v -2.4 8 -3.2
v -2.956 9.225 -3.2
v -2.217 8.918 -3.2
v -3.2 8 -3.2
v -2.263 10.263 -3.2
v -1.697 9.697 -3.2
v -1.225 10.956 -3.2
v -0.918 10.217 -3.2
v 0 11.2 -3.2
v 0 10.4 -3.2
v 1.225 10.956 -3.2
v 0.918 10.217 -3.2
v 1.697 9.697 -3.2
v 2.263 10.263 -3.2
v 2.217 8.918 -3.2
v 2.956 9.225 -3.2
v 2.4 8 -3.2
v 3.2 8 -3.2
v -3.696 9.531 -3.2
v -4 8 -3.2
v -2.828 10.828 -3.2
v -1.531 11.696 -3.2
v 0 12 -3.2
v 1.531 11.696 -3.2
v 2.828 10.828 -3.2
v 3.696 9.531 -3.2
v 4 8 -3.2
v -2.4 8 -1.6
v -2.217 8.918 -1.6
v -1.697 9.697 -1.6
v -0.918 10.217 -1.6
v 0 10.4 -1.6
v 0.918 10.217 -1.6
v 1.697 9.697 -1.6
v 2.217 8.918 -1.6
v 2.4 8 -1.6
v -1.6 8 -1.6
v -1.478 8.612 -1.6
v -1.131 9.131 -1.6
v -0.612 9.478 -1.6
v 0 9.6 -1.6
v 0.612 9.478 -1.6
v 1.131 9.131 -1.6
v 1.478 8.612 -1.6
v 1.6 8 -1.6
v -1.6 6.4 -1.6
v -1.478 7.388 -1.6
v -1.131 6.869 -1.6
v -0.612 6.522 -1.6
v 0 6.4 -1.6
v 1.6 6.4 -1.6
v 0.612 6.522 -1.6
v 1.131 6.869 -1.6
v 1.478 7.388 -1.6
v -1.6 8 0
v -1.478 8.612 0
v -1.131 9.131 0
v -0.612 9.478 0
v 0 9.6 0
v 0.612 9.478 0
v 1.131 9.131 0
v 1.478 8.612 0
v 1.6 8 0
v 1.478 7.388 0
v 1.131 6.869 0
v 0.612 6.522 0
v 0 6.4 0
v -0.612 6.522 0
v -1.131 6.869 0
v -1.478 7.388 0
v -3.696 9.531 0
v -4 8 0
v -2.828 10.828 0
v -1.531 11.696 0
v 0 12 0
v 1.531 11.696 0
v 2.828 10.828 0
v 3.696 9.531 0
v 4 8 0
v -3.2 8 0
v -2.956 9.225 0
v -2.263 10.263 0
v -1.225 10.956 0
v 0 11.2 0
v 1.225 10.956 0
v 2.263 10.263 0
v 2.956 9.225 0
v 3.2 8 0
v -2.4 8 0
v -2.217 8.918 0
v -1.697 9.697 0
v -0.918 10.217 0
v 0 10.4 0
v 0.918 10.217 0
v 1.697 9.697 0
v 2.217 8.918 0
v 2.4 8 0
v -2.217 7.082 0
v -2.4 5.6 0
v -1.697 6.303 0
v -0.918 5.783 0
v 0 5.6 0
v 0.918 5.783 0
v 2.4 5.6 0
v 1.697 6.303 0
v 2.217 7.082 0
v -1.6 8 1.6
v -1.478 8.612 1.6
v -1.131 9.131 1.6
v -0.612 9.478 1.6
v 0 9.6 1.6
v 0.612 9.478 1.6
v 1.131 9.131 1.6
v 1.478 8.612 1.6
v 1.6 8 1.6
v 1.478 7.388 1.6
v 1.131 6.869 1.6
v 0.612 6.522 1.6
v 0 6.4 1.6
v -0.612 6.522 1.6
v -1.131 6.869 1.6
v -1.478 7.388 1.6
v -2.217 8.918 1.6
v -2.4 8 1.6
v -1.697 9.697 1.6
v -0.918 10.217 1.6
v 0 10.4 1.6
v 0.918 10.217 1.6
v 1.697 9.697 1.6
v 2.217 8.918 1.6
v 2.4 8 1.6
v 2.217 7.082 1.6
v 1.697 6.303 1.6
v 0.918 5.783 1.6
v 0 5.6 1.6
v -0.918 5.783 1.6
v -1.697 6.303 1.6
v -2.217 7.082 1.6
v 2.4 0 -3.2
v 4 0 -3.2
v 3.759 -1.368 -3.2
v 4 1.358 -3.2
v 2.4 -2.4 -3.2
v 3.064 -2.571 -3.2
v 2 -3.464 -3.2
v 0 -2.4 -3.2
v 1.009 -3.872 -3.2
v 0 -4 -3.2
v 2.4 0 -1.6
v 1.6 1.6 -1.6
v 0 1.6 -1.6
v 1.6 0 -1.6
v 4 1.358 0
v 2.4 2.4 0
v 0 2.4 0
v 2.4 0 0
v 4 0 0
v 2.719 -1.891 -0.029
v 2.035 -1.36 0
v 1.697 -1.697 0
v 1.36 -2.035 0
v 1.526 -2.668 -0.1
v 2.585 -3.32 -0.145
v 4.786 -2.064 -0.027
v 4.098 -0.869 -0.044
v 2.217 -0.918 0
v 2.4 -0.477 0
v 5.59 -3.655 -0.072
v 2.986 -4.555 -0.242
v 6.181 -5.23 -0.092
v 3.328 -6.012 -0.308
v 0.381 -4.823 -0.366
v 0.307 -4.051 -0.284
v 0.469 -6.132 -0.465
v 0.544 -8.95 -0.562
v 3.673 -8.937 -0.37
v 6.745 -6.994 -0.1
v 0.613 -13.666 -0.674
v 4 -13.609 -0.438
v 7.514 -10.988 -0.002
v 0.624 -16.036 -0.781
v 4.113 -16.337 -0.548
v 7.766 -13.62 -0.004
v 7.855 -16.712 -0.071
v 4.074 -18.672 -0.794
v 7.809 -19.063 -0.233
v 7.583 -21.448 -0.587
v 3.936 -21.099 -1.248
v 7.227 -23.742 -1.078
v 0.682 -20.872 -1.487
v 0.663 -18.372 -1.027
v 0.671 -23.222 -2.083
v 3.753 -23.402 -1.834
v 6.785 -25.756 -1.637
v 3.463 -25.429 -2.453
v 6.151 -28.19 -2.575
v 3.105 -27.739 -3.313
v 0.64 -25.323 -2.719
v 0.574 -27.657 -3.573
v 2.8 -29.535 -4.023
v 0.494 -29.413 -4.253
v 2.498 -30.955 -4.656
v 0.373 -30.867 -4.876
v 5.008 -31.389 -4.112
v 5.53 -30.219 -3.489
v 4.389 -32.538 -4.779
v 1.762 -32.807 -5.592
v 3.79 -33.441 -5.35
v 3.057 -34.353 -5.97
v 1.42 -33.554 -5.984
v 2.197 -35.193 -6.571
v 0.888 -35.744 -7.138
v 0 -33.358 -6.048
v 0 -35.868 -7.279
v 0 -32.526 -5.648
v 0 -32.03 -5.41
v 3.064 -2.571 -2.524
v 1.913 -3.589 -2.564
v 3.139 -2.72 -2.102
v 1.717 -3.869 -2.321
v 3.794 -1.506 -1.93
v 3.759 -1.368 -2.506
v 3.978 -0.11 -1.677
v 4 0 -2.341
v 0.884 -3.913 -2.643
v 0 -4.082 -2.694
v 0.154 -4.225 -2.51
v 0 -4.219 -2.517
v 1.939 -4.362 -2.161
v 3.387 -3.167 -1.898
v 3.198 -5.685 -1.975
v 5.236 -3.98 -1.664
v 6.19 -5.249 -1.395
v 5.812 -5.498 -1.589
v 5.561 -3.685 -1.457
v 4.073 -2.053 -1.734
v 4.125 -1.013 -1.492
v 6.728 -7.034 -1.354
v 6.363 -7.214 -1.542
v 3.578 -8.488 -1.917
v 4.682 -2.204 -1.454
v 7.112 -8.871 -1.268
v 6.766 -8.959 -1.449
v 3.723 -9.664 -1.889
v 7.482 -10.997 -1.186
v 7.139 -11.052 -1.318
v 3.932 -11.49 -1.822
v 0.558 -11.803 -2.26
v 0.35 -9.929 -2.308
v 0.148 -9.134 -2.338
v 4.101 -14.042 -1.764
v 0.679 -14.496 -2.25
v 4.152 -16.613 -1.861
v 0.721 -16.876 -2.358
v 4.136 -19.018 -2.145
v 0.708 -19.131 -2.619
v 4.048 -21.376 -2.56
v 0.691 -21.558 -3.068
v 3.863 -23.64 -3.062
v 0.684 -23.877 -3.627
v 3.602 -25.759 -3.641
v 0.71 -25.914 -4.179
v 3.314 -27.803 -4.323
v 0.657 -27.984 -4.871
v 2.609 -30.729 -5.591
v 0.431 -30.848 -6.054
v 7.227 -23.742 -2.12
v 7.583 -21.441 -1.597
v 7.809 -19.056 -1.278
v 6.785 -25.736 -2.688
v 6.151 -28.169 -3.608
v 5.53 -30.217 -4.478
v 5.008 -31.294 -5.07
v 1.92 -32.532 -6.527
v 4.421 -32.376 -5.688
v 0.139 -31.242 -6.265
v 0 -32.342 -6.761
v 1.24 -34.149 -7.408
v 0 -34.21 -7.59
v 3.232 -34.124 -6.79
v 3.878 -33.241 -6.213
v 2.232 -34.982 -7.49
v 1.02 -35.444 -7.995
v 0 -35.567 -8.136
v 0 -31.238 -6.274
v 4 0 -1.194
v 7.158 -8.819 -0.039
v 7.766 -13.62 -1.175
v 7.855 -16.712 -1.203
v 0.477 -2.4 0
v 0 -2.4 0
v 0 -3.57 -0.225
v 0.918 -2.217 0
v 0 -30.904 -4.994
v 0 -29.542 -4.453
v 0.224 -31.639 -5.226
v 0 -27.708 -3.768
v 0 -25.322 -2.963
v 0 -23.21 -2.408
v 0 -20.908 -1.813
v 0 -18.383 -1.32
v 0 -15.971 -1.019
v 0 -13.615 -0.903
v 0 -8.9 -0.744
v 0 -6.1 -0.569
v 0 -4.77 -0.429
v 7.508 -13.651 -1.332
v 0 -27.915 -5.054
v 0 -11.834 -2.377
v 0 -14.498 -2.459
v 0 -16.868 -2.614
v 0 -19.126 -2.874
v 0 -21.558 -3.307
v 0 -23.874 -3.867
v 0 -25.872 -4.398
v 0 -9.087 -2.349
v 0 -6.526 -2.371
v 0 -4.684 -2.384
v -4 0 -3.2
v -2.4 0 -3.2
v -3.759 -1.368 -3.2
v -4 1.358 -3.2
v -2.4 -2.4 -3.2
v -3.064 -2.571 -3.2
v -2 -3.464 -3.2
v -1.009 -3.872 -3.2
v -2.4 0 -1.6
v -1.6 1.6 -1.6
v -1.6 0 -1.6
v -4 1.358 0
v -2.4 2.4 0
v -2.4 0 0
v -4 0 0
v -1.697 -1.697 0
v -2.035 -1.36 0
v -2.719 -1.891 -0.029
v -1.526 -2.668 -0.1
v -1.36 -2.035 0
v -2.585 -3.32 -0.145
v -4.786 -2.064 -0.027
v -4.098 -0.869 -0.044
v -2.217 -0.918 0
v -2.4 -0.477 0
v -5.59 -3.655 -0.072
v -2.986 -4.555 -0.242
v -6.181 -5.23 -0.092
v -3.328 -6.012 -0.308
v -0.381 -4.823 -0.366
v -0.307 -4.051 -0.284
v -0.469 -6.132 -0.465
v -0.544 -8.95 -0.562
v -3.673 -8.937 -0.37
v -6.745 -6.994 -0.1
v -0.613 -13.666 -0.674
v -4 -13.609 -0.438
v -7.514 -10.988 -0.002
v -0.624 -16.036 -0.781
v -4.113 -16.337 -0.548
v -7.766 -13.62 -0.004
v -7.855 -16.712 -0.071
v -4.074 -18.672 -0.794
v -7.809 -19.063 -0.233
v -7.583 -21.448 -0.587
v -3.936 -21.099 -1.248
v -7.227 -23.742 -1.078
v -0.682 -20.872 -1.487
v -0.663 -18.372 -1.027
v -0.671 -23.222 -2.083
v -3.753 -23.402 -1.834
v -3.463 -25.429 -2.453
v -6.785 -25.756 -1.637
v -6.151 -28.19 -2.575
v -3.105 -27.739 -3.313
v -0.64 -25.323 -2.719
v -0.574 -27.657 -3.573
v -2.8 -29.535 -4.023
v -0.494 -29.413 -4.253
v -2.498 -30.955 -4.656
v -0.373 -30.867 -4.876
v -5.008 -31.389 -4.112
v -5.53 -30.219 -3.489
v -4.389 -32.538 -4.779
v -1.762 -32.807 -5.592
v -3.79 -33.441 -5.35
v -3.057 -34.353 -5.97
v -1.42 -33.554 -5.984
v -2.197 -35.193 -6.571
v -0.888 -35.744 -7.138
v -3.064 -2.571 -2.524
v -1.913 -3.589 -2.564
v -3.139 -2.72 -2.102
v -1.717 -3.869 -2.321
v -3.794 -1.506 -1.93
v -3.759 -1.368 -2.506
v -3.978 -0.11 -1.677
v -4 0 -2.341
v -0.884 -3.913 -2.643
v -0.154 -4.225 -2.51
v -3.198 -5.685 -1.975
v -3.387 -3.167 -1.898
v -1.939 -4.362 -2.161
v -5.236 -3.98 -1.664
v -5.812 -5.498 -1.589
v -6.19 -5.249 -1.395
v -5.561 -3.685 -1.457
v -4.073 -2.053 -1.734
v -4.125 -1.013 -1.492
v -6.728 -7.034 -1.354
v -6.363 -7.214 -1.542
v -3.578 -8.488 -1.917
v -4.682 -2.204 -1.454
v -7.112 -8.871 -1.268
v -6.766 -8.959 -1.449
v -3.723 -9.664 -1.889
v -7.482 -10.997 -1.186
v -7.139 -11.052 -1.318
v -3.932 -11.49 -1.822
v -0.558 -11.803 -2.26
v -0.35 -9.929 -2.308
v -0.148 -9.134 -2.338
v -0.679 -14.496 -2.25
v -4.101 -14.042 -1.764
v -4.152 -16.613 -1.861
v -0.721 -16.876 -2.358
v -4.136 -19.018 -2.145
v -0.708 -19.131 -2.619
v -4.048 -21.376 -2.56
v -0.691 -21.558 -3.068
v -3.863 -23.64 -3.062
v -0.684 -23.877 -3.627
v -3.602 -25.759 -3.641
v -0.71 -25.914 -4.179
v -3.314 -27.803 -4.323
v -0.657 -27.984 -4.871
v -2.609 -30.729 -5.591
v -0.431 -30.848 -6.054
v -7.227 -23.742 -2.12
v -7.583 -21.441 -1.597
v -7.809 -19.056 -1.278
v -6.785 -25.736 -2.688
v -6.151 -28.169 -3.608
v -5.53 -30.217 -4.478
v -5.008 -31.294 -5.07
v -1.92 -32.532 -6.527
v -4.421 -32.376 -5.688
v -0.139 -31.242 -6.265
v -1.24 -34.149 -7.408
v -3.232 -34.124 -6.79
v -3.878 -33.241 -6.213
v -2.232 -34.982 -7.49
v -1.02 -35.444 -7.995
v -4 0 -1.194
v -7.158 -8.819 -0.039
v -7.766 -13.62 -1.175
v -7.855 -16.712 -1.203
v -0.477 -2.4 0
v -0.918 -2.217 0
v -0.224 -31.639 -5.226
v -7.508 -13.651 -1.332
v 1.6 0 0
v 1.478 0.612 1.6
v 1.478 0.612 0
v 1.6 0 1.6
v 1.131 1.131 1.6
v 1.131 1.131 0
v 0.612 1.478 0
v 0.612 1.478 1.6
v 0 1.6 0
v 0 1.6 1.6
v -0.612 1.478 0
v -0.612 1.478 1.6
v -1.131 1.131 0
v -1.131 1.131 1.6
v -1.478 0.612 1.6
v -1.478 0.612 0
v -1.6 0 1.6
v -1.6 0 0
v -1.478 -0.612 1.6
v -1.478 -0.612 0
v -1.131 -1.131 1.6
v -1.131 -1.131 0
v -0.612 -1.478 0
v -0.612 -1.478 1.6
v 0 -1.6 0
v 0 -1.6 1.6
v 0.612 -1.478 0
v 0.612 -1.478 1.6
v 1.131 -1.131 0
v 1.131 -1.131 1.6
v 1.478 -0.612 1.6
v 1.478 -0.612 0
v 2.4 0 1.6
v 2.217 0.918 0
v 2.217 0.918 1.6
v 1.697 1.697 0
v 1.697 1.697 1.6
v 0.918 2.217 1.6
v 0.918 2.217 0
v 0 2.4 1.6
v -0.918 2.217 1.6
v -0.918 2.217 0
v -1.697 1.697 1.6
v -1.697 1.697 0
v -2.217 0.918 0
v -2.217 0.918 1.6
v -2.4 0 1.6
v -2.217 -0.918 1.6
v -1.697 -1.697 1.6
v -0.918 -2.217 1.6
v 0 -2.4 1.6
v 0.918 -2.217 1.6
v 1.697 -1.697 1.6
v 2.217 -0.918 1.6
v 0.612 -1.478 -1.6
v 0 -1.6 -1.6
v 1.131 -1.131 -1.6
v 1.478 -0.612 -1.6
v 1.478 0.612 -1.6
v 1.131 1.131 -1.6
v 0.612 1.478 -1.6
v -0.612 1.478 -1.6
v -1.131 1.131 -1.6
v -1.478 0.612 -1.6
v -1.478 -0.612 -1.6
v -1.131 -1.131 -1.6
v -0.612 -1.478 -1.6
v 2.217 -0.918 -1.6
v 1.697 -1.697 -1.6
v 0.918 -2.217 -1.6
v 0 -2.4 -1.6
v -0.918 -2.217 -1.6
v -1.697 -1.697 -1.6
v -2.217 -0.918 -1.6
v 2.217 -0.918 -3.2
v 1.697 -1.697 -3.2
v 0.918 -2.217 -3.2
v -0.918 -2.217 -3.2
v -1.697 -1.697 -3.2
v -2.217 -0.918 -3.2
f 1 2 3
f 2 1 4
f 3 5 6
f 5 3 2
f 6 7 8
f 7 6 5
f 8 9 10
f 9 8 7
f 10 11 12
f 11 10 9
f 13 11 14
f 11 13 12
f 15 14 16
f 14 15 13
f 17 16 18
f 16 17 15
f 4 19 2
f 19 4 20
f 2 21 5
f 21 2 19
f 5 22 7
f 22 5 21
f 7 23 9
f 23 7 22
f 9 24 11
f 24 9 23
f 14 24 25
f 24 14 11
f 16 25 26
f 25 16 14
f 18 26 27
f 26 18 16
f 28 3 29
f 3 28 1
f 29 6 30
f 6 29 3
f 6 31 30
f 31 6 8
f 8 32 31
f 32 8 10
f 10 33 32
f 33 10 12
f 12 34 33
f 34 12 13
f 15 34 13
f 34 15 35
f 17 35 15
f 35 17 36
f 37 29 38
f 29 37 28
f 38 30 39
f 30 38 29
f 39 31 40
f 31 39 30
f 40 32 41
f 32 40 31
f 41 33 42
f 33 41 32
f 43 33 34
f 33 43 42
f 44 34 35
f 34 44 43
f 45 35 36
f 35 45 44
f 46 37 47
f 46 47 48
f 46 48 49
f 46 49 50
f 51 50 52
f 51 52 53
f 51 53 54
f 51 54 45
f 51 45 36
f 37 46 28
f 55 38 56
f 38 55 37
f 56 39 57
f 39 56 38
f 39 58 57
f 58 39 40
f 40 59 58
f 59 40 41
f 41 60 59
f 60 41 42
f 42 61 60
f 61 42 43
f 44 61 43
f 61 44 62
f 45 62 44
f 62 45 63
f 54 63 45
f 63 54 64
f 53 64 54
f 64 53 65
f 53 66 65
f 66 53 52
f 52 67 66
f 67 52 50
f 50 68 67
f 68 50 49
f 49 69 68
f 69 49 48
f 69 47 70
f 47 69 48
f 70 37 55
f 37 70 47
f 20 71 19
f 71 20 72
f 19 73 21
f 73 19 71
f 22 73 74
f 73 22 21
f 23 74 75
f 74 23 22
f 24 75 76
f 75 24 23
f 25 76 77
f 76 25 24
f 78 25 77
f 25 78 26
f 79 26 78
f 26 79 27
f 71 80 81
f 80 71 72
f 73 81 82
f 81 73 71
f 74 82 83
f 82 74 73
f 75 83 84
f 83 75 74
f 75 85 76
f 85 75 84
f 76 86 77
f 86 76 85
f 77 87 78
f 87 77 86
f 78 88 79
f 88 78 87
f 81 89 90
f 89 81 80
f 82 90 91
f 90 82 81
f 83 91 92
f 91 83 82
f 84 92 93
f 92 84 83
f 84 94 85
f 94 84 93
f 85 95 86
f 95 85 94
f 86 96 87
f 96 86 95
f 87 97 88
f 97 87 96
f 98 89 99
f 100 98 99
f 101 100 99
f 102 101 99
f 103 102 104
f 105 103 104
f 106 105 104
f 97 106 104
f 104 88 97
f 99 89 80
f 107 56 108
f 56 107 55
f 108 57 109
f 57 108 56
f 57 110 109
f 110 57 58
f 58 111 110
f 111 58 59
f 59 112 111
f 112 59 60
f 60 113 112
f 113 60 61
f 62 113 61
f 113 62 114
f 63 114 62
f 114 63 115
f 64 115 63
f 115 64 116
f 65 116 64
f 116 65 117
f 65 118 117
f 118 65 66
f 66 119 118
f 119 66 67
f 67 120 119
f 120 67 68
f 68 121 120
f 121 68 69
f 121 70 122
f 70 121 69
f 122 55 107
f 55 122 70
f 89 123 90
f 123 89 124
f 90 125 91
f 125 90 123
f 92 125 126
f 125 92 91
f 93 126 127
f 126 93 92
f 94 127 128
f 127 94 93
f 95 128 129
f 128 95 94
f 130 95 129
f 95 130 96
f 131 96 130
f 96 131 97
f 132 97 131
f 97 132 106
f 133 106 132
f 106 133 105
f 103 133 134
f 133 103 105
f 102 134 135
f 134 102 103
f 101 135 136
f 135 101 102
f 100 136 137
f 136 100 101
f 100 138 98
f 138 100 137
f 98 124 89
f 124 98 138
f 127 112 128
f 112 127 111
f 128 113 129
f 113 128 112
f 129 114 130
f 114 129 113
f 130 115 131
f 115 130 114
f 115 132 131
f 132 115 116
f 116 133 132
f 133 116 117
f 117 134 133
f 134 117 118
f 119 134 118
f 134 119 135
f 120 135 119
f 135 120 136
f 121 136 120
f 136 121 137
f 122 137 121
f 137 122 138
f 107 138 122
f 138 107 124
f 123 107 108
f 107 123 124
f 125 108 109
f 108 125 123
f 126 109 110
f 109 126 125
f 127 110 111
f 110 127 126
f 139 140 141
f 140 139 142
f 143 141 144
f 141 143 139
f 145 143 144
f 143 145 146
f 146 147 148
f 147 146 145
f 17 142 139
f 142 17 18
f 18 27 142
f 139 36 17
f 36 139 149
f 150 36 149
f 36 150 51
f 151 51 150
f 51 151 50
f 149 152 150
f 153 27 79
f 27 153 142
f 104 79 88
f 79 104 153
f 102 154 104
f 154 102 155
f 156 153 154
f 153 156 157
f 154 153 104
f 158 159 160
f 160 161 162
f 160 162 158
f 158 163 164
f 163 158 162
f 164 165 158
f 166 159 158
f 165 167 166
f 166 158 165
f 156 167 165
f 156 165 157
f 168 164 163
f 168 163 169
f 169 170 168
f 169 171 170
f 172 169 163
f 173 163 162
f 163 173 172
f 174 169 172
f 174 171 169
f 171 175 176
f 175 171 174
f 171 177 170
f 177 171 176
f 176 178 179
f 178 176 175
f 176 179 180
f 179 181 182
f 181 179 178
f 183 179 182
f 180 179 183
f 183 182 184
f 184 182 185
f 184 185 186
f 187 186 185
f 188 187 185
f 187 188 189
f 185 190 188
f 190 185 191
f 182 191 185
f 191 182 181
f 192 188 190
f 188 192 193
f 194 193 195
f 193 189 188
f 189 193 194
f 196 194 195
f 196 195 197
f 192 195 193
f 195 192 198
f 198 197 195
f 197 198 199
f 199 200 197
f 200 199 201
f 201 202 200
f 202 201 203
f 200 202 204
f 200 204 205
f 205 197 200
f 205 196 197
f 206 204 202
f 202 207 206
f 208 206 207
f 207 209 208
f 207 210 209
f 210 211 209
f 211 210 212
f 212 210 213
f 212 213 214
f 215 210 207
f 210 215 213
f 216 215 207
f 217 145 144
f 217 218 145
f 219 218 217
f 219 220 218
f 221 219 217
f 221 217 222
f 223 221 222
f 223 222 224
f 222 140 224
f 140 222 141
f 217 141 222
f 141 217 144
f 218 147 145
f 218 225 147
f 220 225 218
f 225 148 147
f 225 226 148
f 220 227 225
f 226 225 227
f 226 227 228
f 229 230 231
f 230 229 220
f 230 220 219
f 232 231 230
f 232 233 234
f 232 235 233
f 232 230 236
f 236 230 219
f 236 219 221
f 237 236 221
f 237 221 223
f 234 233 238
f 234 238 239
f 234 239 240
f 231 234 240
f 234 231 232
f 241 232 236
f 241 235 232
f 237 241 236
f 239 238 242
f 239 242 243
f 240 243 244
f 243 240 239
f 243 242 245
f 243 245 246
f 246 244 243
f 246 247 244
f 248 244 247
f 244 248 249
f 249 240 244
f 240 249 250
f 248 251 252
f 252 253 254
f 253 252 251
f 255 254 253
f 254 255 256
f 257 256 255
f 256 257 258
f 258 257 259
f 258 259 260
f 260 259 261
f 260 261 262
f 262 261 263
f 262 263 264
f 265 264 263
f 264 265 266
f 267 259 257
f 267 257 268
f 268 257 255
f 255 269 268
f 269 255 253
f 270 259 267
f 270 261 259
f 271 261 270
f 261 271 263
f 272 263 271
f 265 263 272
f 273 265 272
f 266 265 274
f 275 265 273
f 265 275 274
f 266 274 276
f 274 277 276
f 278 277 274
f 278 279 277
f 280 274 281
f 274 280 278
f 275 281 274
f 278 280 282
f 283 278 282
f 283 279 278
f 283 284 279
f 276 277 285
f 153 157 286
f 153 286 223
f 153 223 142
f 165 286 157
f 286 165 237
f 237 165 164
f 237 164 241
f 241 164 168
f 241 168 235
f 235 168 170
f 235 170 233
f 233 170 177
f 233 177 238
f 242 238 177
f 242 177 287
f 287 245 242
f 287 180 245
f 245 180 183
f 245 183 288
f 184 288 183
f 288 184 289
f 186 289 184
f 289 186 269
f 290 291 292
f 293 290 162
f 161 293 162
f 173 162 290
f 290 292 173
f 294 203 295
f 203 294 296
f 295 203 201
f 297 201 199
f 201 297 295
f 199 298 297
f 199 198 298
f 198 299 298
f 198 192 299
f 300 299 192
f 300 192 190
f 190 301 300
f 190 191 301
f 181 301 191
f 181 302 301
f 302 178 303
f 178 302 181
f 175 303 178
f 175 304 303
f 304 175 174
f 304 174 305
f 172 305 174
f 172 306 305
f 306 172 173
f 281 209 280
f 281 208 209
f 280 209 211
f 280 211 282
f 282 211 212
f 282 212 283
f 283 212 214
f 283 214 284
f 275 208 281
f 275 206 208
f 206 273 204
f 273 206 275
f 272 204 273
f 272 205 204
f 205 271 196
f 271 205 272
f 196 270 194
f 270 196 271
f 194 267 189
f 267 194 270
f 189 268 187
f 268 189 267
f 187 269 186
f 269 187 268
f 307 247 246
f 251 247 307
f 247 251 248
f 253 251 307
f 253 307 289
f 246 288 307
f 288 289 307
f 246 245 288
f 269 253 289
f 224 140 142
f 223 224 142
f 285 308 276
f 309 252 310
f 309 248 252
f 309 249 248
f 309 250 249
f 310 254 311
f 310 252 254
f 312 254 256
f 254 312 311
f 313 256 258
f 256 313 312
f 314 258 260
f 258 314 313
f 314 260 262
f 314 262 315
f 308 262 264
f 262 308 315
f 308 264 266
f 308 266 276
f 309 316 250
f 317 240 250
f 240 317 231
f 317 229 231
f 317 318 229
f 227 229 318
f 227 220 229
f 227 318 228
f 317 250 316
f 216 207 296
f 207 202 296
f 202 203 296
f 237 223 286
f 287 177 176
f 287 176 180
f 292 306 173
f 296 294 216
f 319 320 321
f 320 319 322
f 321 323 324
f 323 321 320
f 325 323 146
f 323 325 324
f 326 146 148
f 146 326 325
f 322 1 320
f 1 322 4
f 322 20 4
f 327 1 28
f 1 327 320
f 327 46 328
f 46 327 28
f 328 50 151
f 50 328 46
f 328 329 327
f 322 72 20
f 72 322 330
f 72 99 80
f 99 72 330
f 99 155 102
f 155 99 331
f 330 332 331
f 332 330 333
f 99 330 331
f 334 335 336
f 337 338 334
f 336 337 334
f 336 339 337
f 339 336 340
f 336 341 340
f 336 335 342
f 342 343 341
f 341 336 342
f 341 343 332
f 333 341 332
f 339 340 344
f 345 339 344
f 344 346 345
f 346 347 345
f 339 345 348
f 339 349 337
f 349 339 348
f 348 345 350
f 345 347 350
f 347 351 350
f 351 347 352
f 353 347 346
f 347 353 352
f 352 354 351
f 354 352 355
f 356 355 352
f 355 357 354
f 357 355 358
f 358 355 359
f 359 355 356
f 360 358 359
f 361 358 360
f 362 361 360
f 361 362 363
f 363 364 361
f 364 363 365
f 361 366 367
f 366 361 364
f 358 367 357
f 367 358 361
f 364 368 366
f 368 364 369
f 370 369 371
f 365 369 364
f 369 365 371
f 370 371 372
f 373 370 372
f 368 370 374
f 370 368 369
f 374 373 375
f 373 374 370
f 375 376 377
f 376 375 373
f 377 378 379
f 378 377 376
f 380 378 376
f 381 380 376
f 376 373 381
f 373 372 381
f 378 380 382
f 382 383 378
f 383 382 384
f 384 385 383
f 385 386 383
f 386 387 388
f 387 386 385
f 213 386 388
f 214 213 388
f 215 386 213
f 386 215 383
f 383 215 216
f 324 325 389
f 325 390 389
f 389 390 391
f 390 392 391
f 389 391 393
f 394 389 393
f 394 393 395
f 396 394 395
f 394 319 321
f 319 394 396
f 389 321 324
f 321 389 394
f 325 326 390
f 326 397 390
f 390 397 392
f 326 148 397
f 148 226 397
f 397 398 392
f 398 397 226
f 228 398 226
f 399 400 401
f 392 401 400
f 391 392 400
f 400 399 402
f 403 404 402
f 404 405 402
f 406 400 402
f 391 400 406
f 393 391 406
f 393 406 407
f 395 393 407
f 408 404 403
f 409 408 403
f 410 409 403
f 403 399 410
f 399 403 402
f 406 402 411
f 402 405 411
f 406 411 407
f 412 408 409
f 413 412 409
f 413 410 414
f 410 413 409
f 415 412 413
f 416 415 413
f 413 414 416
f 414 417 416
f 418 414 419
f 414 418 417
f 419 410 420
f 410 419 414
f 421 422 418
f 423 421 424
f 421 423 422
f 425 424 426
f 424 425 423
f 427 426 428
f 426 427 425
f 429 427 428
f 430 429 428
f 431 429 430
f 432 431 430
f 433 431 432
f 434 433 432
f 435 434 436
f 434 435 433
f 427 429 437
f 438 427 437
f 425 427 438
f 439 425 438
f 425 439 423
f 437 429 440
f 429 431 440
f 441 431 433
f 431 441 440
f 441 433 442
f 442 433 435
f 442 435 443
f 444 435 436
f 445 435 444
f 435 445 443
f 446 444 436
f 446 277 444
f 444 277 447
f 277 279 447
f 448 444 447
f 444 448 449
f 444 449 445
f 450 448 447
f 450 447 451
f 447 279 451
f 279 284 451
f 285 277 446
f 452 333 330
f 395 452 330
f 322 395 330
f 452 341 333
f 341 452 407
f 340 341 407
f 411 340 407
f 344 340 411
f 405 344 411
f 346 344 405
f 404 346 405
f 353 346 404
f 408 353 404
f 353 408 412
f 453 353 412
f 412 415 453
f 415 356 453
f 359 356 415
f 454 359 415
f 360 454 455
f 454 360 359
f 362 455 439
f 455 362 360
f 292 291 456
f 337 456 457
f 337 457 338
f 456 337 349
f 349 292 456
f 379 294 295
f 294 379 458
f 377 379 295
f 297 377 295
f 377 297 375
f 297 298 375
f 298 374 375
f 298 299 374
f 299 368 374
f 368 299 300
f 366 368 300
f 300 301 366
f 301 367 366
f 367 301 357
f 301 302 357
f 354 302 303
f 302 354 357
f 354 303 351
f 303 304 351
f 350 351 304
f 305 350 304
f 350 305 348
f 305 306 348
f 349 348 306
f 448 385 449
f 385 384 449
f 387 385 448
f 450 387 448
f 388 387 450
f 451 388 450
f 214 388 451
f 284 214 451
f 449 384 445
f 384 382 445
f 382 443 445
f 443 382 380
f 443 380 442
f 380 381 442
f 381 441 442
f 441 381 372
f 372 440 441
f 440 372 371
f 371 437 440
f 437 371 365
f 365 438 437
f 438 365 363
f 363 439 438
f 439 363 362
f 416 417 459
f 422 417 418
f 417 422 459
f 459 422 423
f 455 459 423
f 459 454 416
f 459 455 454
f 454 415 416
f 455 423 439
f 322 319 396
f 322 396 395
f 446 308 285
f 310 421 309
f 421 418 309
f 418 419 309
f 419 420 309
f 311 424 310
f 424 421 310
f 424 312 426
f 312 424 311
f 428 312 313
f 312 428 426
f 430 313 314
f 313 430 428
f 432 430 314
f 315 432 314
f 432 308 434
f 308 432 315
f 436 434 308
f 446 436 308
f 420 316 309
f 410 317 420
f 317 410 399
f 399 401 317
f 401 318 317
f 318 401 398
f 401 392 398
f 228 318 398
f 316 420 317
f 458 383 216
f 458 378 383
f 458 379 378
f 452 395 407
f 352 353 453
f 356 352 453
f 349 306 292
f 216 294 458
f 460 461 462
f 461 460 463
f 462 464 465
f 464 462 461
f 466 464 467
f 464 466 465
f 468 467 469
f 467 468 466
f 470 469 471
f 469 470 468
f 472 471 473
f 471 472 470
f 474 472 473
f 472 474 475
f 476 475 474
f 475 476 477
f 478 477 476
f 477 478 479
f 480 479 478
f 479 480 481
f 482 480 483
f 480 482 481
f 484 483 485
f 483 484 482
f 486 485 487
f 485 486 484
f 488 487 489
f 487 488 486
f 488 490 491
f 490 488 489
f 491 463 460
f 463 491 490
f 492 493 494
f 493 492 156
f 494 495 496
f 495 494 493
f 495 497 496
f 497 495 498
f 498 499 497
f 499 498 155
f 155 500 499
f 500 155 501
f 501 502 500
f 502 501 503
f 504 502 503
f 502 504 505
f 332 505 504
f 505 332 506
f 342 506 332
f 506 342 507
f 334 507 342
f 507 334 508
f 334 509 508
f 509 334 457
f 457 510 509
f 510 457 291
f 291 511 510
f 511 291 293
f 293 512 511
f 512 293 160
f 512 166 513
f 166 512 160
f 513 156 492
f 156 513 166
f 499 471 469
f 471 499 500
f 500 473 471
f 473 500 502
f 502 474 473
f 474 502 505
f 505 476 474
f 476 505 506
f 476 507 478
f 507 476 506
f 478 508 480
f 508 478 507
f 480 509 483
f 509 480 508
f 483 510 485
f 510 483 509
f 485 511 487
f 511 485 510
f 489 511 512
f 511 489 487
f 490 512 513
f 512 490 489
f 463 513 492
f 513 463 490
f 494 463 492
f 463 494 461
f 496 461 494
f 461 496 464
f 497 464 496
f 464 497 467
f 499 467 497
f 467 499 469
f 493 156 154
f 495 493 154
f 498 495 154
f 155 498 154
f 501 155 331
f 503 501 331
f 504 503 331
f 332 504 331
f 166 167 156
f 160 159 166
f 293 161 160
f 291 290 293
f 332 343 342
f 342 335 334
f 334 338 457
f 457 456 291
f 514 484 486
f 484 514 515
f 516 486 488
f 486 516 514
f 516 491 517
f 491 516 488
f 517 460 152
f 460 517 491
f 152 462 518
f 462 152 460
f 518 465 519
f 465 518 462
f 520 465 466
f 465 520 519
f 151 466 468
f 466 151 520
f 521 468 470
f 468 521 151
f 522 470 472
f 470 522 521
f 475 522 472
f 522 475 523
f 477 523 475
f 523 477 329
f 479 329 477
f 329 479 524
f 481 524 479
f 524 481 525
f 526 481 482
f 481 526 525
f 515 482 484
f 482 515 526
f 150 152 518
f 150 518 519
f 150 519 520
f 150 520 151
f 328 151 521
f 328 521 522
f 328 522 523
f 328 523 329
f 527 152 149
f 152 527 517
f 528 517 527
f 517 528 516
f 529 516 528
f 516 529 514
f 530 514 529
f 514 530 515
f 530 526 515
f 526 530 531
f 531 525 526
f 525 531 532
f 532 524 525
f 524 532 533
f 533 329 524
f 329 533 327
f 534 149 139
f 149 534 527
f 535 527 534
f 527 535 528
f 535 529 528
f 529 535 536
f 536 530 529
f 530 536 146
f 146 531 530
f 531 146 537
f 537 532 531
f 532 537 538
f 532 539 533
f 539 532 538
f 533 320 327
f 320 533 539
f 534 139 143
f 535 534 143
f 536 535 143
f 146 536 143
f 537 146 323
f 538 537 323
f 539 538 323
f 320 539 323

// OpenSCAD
use <../lib.scad>
use <../p/1-4tang.scad>
use <../p/2-4cylo.scad>
use <../p/2-4ndis.scad>
use <../p/2-4ring2.scad>
use <../p/4-4cyli.scad>
use <../p/4-4edge.scad>
use <s/3565s01.scad>
use <s/77850s01.scad>
use <../p/stud2a.scad>
function ldraw_lib__3565() = [
// 0 Plant Palm Leaf  2 x  6 Rounded with Rounded  1 x 2 Plate
// 0 Name: 3565.dat
// 0 Author: Gerald Lasser [GeraldLasser]
// 0 !LDRAW_ORG Part UPDATE 2023-07
// 0 !LICENSE Licensed under CC BY 4.0 : see CAreadme.txt
// 
// 0 BFC CERTIFY CCW
  [0,"BFC","CERTIFY"],
  [0,"BFC","CCW"],
// 
// 0 !HISTORY 2023-08-01 {LEGO Instructions App} Original part shape
// 0 !HISTORY 2023-11-29 [GeraldLasser] File preparation for LDraw Parts Tracker
// 0 !HISTORY 2023-12-31 [OrionP] Official Update 2023-07
// 
// 1 16 0 0 20 0 0 -1 0 1 0 -1 0 0 s\77850s01.dat
  [1,16,0,0,20,0,0,-1,0,1,0,-1,0,0, ldraw_lib__s__77850s01()],
// 1 16 0 0 0 1 0 0 0 1 0 0 0 1 s\3565s01.dat
  [1,16,0,0,0,1,0,0,0,1,0,0,0,1, ldraw_lib__s__3565s01()],
// 1 16 0 0 0 -1 0 0 0 1 0 0 0 1 s\3565s01.dat
  [1,16,0,0,0,-1,0,0,0,1,0,0,0,1, ldraw_lib__s__3565s01()],
// 
// 1 16 0 0 0 1 0 0 0 1 0 0 0 1 stud2a.dat
  [1,16,0,0,0,1,0,0,0,1,0,0,0,1, ldraw_lib__stud2a()],
// 1 16 0 0 0 6 0 0 0 1 0 0 0 6 2-4ndis.dat
  [1,16,0,0,0,6,0,0,0,1,0,0,0,6, ldraw_lib__2_4ndis()],
// 1 16 0 0 0 6 0 0 0 1 0 0 0 -6 1-4tang.dat
  [1,16,0,0,0,6,0,0,0,1,0,0,0,-6, ldraw_lib__1_4tang()],
// 1 16 0 0 0 -6 0 0 0 1 0 0 0 -6 1-4tang.dat
  [1,16,0,0,0,-6,0,0,0,1,0,0,0,-6, ldraw_lib__1_4tang()],
// 1 16 0 0 0 0 0 6 0 1 0 -6 0 0 4-4edge.dat
  [1,16,0,0,0,0,0,6,0,1,0,-6,0,0, ldraw_lib__4_4edge()],
// 0 BFC INVERTNEXT
  [0,"BFC","INVERTNEXT"],
// 1 16 0 0 0 0 0 4 0 4 0 -4 0 0 4-4cyli.dat
  [1,16,0,0,0,0,0,4,0,4,0,-4,0,0, ldraw_lib__4_4cyli()],
// 1 16 0 4 0 0 0 4 0 1 0 -4 0 0 4-4edge.dat
  [1,16,0,4,0,0,0,4,0,1,0,-4,0,0, ldraw_lib__4_4edge()],
// 1 16 0 4 0 4 0 0 0 -1 0 0 0 4 2-4ndis.dat
  [1,16,0,4,0,4,0,0,0,-1,0,0,0,4, ldraw_lib__2_4ndis()],
// 1 16 0 4 0 2 0 0 0 -1 0 0 0 -2 2-4ring2.dat
  [1,16,0,4,0,2,0,0,0,-1,0,0,0,-2, ldraw_lib__2_4ring2()],
// 0 BFC INVERTNEXT
  [0,"BFC","INVERTNEXT"],
// 1 16 0 4 0 6 0 0 0 4 0 0 0 -6 2-4cylo.dat
  [1,16,0,4,0,6,0,0,0,4,0,0,0,-6, ldraw_lib__2_4cylo()],
// 1 16 0 8 0 6 0 0 0 -1 0 0 0 -6 2-4ndis.dat
  [1,16,0,8,0,6,0,0,0,-1,0,0,0,-6, ldraw_lib__2_4ndis()],
// 
// 5 24 0 12.486 -77.26 0 13.525 -80.075 .56 13.066 -79.097 -.56 13.066 -79.097
  [5,24,0,12.486,-77.26,0,13.525,-80.075,.56,13.066,-79.097,-.56,13.066,-79.097],
// 5 24 0 7.408 -63.306 0 9.42 -69.27 1.435 8.932 -69.142 -1.435 8.932 -69.142
  [5,24,0,7.408,-63.306,0,9.42,-69.27,1.435,8.932,-69.142,-1.435,8.932,-69.142],
// 5 24 0 14.12 -81.315 0 15.12 -83.396 -3.549 14.96 -83.884 3.549 14.96 -83.884
  [5,24,0,14.12,-81.315,0,15.12,-83.396,-3.549,14.96,-83.884,3.549,14.96,-83.884],
// 5 24 0 2.258 -34.038 0 2.548 -39.927 1.559 1.953 -40.09 -1.559 1.953 -40.09
  [5,24,0,2.258,-34.038,0,2.548,-39.927,1.559,1.953,-40.09,-1.559,1.953,-40.09],
// 5 24 0 18.976 -85.526 0 16.902 -80.855 -3.099 18.519 -85.372 3.099 18.519 -85.372
  [5,24,0,18.976,-85.526,0,16.902,-80.855,-3.099,18.519,-85.372,3.099,18.519,-85.372],
// 5 24 0 .563 -8.924 0 1.072 -11.925 .768 .709 -10.128 -.768 .709 -10.128
  [5,24,0,.563,-8.924,0,1.072,-11.925,.768,.709,-10.128,-.768,.709,-10.128],
// 5 24 0 11.132 -73.854 0 12.486 -77.26 .56 13.066 -79.097 -.56 13.066 -79.097
  [5,24,0,11.132,-73.854,0,12.486,-77.26,.56,13.066,-79.097,-.56,13.066,-79.097],
// 5 24 0 12.636 -69.787 0 10.995 -64.681 -1.775 10.447 -64.784 1.775 10.447 -64.784
  [5,24,0,12.636,-69.787,0,10.995,-64.681,-1.775,10.447,-64.784,1.775,10.447,-64.784],
// 5 24 0 5.873 -22.718 0 5.927 -16.314 -.371 5.844 -22.836 .371 5.844 -22.836
  [5,24,0,5.873,-22.718,0,5.927,-16.314,-.371,5.844,-22.836,.371,5.844,-22.836],
// 5 24 0 6.734 -10.206 0 8 -10 -2.209 6.608 -9.782 2.209 6.608 -9.782
  [5,24,0,6.734,-10.206,0,8,-10,-2.209,6.608,-9.782,2.209,6.608,-9.782],
// 5 24 0 4.533 -52.271 0 6.02 -58.026 -1.678 5.207 -58.056 1.678 5.207 -58.056
  [5,24,0,4.533,-52.271,0,6.02,-58.026,-1.678,5.207,-58.056,1.678,5.207,-58.056],
// 5 24 0 15.12 -83.396 0 18.197 -89.669 2.219 17.846 -89.36 -2.219 17.846 -89.36
  [5,24,0,15.12,-83.396,0,18.197,-89.669,2.219,17.846,-89.36,-2.219,17.846,-89.36],
// 5 24 0 6.147 -36.245 0 5.942 -29.584 1.697 5.625 -36.241 -1.697 5.625 -36.241
  [5,24,0,6.147,-36.245,0,5.942,-29.584,1.697,5.625,-36.241,-1.697,5.625,-36.241],
// 5 24 0 2.548 -39.927 0 3.299 -45.957 1.559 1.953 -40.09 -1.559 1.953 -40.09
  [5,24,0,2.548,-39.927,0,3.299,-45.957,1.559,1.953,-40.09,-1.559,1.953,-40.09],
// 5 24 0 9.42 -69.27 0 11.132 -73.854 1.236 10.632 -73.533 -1.236 10.632 -73.533
  [5,24,0,9.42,-69.27,0,11.132,-73.854,1.236,10.632,-73.533,-1.236,10.632,-73.533],
// 5 24 0 9.667 -59.686 0 8.267 -53.896 1.727 7.671 -53.896 -1.727 7.671 -53.896
  [5,24,0,9.667,-59.686,0,8.267,-53.896,1.727,7.671,-53.896,-1.727,7.671,-53.896],
// 5 24 0 1.072 -11.925 0 1.423 -15.249 .953 .916 -12.057 -.953 .916 -12.057
  [5,24,0,1.072,-11.925,0,1.423,-15.249,.953,.916,-12.057,-.953,.916,-12.057],
// 5 24 0 18.197 -89.669 0 20.339 -88.917 2.551 19.987 -88.611 -2.551 19.987 -88.611
  [5,24,0,18.197,-89.669,0,20.339,-88.917,2.551,19.987,-88.611,-2.551,19.987,-88.611],
// 5 24 0 10.995 -64.681 0 9.667 -59.686 1.775 10.447 -64.784 -1.775 10.447 -64.784
  [5,24,0,10.995,-64.681,0,9.667,-59.686,1.775,10.447,-64.784,-1.775,10.447,-64.784],
// 5 24 0 1.86 -22.249 0 2.258 -34.038 1.361 1.406 -22.374 -1.361 1.406 -22.374
  [5,24,0,1.86,-22.249,0,2.258,-34.038,1.361,1.406,-22.374,-1.361,1.406,-22.374],
// 5 24 0 16.902 -80.855 0 15.686 -78.095 -.348 15.663 -78.104 .348 15.663 -78.104
  [5,24,0,16.902,-80.855,0,15.686,-78.095,-.348,15.663,-78.104,.348,15.663,-78.104],
// 5 24 0 6.293 -10.547 0 6.734 -10.206 -.385 6.275 -10.563 .385 6.275 -10.563
  [5,24,0,6.293,-10.547,0,6.734,-10.206,-.385,6.275,-10.563,.385,6.275,-10.563],
// 5 24 0 3.299 -45.957 0 4.533 -52.271 -1.704 3.717 -52.181 1.704 3.717 -52.181
  [5,24,0,3.299,-45.957,0,4.533,-52.271,-1.704,3.717,-52.181,1.704,3.717,-52.181],
// 5 24 0 6.535 -42.171 0 6.147 -36.245 1.803 5.894 -42.191 -1.803 5.894 -42.191
  [5,24,0,6.535,-42.171,0,6.147,-36.245,1.803,5.894,-42.191,-1.803,5.894,-42.191],
// 5 24 0 5.942 -29.584 0 5.873 -22.718 -.371 5.844 -22.836 .371 5.844 -22.836
  [5,24,0,5.942,-29.584,0,5.873,-22.718,-.371,5.844,-22.836,.371,5.844,-22.836],
// 5 24 0 20.339 -88.917 0 18.976 -85.526 2.551 19.987 -88.611 -2.551 19.987 -88.611
  [5,24,0,20.339,-88.917,0,18.976,-85.526,2.551,19.987,-88.611,-2.551,19.987,-88.611],
// 5 24 0 5.927 -16.314 0 5.961 -11.71 4.848 5.403 -10.904 -4.848 5.403 -10.904
  [5,24,0,5.927,-16.314,0,5.961,-11.71,4.848,5.403,-10.904,-4.848,5.403,-10.904],
// 5 24 0 7.186 -47.816 0 6.535 -42.171 -1.803 5.894 -42.191 1.803 5.894 -42.191
  [5,24,0,7.186,-47.816,0,6.535,-42.171,-1.803,5.894,-42.191,1.803,5.894,-42.191],
// 5 24 0 8.267 -53.896 0 7.186 -47.816 -1.771 6.547 -47.827 1.771 6.547 -47.827
  [5,24,0,8.267,-53.896,0,7.186,-47.816,-1.771,6.547,-47.827,1.771,6.547,-47.827],
// 5 24 0 15.686 -78.095 0 12.636 -69.787 .348 15.663 -78.104 -.348 15.663 -78.104
  [5,24,0,15.686,-78.095,0,12.636,-69.787,.348,15.663,-78.104,-.348,15.663,-78.104],
// 5 24 0 13.525 -80.075 0 14.12 -81.315 -4.406 13.979 -82.017 4.406 13.979 -82.017
  [5,24,0,13.525,-80.075,0,14.12,-81.315,-4.406,13.979,-82.017,4.406,13.979,-82.017],
// 5 24 0 5.961 -11.71 0 6.293 -10.547 -.385 6.275 -10.563 .385 6.275 -10.563
  [5,24,0,5.961,-11.71,0,6.293,-10.547,-.385,6.275,-10.563,.385,6.275,-10.563],
// 5 24 0 6.02 -58.026 0 7.408 -63.306 1.599 6.798 -63.307 -1.599 6.798 -63.307
  [5,24,0,6.02,-58.026,0,7.408,-63.306,1.599,6.798,-63.307,-1.599,6.798,-63.307],
// 5 24 0 1.423 -15.249 0 1.86 -22.249 1.172 1.162 -15.33 -1.172 1.162 -15.33
  [5,24,0,1.423,-15.249,0,1.86,-22.249,1.172,1.162,-15.33,-1.172,1.162,-15.33],
];
module ldraw_lib__3565(step=0, col=false, unit=2/5, alt=false, line=0.2, solid=!$preview)
    makepoly(ldraw_lib__3565(), step=step, col=col, unit=unit, alt=alt, line=line, solid=solid);
ldraw_lib__3565(line=0.2);
